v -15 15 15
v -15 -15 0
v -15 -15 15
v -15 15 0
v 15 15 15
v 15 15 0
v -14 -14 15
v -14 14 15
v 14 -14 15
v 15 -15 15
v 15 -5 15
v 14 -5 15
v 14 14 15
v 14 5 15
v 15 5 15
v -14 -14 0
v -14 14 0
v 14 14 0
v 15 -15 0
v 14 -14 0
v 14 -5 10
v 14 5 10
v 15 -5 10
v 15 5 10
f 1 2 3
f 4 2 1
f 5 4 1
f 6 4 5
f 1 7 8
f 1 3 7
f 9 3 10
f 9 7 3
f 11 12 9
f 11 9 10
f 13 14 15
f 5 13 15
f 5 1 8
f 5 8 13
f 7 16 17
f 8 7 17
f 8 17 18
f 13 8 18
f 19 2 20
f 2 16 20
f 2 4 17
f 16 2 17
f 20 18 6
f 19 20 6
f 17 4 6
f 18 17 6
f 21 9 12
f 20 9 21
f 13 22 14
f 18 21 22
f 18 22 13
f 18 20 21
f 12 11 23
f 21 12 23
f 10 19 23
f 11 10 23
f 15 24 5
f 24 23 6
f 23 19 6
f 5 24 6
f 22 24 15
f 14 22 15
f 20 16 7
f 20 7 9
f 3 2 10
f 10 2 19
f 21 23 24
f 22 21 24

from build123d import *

# Parameters (mm, degrees)
F0_W     = 30
F0_H     = 30
F0_W_2   = 28
F0_H_2   = 28
F1_DEPTH = 15
F2_W     = 10
F2_H     = 5
F3_DEPTH = 25


with BuildPart() as f1:
    # F0 (on Top) → F1 (new body)
    with BuildSketch(Plane.XY):
        Rectangle(F0_W, F0_H)
        Rectangle(F0_W_2, F0_H_2, mode=Mode.SUBTRACT)
    extrude(amount=F1_DEPTH)

    # F2 (on face) → F3 (cut)
    with BuildSketch(Plane.YZ.offset(15)):
        with Locations((0, 17.5)):
            Rectangle(F2_W, F2_H)
        with Locations((0, 12.5)):
            Rectangle(F2_W, F2_H)
    extrude(amount=-F3_DEPTH, mode=Mode.SUBTRACT)


solid = f1.part
